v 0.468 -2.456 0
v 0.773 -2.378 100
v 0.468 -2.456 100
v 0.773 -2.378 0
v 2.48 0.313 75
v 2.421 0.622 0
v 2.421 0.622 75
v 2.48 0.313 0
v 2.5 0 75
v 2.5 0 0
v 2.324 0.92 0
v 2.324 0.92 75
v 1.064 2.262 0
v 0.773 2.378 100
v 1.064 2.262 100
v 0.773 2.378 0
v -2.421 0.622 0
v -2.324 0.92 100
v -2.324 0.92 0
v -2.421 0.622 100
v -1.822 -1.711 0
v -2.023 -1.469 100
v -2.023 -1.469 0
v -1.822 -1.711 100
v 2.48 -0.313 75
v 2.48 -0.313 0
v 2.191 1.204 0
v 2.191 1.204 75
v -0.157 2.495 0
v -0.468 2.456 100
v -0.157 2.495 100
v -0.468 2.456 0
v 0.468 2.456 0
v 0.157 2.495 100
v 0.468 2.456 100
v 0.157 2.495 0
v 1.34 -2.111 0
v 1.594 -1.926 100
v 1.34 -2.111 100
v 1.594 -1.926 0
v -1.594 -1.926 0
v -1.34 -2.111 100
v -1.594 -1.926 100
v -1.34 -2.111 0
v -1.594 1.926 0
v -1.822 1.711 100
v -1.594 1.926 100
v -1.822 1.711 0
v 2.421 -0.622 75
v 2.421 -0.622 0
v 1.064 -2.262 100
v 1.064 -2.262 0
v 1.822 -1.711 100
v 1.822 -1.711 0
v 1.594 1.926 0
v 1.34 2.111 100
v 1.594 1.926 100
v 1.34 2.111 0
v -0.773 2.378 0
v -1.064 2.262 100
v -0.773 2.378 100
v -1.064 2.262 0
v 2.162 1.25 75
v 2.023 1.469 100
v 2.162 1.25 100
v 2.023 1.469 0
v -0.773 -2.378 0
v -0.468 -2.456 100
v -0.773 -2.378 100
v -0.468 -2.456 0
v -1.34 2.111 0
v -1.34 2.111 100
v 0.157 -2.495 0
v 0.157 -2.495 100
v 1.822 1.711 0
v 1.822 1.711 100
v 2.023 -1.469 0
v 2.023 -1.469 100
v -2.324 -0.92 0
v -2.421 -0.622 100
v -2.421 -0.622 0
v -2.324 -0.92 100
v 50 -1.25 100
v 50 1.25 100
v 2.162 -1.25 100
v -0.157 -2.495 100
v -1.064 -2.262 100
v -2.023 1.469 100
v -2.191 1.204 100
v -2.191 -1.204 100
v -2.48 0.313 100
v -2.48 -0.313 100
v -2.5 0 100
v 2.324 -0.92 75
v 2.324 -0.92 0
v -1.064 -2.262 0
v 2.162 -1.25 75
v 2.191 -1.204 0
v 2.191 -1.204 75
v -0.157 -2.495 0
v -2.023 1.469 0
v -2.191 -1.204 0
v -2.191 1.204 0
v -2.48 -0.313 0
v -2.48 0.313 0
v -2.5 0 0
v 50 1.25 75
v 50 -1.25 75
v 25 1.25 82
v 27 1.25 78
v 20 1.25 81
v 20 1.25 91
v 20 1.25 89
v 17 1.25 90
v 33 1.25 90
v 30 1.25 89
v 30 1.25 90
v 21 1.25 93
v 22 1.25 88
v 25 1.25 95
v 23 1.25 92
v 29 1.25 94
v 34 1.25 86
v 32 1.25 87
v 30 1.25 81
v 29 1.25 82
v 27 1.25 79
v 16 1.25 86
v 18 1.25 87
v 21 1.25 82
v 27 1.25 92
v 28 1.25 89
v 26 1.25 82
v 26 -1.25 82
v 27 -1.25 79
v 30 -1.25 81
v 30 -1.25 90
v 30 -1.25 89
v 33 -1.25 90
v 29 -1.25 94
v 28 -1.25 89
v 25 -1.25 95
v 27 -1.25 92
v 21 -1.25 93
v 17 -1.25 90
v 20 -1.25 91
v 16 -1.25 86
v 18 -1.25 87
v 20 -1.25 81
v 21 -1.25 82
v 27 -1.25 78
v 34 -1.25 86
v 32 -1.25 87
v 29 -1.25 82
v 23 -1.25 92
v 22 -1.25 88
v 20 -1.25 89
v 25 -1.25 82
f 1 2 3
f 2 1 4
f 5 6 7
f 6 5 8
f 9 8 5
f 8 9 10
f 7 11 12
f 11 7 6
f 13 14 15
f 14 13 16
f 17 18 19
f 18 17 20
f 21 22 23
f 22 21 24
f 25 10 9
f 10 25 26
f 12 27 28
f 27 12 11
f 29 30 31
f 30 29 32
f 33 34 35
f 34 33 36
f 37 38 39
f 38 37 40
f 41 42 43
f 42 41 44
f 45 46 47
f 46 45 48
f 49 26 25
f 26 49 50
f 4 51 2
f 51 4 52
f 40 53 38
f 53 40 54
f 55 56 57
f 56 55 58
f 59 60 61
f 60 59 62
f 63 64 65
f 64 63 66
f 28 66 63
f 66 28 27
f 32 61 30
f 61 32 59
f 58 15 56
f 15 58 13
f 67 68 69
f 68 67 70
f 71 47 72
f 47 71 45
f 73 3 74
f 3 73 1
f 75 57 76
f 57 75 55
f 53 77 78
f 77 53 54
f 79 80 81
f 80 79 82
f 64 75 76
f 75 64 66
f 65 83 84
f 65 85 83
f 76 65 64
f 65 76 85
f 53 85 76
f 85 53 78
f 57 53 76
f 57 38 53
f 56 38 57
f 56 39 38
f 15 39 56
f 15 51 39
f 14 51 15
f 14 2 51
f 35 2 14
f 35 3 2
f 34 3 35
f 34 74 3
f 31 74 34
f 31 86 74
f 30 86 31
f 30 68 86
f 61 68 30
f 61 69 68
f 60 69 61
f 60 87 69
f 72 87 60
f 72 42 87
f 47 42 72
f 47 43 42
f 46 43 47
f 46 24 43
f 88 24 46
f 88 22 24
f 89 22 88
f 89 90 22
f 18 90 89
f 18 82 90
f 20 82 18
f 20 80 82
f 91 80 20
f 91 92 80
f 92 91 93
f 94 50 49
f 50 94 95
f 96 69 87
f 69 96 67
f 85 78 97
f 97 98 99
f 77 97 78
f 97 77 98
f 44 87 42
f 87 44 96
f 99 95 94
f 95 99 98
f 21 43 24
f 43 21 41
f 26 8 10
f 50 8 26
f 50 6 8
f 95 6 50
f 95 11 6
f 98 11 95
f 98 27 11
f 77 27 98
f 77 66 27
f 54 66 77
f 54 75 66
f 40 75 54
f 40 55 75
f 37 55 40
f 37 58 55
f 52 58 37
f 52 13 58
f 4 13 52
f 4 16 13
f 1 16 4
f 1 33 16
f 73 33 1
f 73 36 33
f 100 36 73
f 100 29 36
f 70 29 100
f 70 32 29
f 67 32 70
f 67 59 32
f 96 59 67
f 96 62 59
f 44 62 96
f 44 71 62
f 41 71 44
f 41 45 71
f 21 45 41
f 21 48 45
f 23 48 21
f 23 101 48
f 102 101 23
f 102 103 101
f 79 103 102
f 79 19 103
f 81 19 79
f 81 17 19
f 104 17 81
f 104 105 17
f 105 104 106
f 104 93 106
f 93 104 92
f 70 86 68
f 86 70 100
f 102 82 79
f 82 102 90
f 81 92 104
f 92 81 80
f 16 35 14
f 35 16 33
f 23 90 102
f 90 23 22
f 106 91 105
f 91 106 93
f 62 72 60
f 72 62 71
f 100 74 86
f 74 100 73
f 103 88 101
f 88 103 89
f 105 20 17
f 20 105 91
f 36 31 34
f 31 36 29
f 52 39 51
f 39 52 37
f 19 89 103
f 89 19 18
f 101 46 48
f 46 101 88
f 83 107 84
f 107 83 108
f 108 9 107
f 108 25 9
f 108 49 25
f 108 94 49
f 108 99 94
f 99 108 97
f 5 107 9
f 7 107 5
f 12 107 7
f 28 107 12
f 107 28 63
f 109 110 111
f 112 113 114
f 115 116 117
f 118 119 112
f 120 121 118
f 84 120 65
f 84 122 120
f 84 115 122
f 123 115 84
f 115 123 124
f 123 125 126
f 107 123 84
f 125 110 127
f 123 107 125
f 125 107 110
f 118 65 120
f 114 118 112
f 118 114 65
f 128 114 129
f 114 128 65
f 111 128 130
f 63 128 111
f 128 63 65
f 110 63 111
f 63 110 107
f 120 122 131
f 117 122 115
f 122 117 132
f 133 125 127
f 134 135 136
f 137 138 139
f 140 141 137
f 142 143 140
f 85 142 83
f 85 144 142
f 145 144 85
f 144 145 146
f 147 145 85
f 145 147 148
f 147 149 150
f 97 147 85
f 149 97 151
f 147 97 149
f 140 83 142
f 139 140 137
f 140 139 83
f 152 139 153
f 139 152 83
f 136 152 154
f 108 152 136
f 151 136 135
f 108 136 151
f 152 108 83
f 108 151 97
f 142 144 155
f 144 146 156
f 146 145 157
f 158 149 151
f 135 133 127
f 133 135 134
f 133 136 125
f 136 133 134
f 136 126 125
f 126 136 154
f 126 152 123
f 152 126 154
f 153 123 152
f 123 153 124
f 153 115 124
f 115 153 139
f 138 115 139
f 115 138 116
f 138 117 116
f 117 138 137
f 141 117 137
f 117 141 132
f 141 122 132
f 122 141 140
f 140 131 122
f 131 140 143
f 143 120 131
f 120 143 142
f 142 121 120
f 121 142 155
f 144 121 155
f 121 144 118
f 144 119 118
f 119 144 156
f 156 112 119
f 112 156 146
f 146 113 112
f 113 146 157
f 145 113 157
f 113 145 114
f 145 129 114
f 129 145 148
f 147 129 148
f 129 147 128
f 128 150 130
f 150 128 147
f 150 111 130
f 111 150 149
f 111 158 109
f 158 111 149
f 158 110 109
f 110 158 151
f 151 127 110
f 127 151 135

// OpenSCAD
/*
 * Modules define object together in a single structure.
 * Parameters:
 *      name - name of the module
 *      parameters - parameters passed to the module to be used within its scope
 *      actions - statements made to produce an ouput
 */
module flag(height, flag_width, flag_height) {
    difference() {
        // Combine flag pole to flag backing.
        union() {
            flag_diameter = height/20;

            cylinder(d = flag_diameter, h = height, $fn = 50); // Flag pole.

            translate([0, -flag_diameter/4, height - flag_height]) // Move flag backing to the top of pole and center.
                cube([flag_width, flag_diameter/2, flag_height]); // Flag back, to be connected to pole and maple leaf.
        }

        // Subtract maple leaf from flag pole and flag backing.
        translate([25, 3, 85]) { // Move up flag pole and to the right.
            rotate([90, 0, 0]) { // Orient maple leaf wrt. pole.
                linear_extrude(height = 6) { // Convert 2D to 3D.
                    // Polygon with vertices made to look like a maple leaf.
                    polygon(points = [[1, -3], [5, -4], [4, -3], [9, 1], [7, 2], [8, 5], [5, 4], [5, 5],
                            [3, 4], [4, 9], [2, 7], [0,10], [-2, 7], [-4, 8], [-3, 3], [-5, 6],
                            [-5, 4], [-8, 5], [-7, 2], [-9, 1], [-4, -3], [-5,-4], [0, -3], [2, -7],
                            [2, -6], [1, -3]]);
                }
            }
        }
    }
}

flag(100, 50, 25); // Draws the flag by calling the flag module.
